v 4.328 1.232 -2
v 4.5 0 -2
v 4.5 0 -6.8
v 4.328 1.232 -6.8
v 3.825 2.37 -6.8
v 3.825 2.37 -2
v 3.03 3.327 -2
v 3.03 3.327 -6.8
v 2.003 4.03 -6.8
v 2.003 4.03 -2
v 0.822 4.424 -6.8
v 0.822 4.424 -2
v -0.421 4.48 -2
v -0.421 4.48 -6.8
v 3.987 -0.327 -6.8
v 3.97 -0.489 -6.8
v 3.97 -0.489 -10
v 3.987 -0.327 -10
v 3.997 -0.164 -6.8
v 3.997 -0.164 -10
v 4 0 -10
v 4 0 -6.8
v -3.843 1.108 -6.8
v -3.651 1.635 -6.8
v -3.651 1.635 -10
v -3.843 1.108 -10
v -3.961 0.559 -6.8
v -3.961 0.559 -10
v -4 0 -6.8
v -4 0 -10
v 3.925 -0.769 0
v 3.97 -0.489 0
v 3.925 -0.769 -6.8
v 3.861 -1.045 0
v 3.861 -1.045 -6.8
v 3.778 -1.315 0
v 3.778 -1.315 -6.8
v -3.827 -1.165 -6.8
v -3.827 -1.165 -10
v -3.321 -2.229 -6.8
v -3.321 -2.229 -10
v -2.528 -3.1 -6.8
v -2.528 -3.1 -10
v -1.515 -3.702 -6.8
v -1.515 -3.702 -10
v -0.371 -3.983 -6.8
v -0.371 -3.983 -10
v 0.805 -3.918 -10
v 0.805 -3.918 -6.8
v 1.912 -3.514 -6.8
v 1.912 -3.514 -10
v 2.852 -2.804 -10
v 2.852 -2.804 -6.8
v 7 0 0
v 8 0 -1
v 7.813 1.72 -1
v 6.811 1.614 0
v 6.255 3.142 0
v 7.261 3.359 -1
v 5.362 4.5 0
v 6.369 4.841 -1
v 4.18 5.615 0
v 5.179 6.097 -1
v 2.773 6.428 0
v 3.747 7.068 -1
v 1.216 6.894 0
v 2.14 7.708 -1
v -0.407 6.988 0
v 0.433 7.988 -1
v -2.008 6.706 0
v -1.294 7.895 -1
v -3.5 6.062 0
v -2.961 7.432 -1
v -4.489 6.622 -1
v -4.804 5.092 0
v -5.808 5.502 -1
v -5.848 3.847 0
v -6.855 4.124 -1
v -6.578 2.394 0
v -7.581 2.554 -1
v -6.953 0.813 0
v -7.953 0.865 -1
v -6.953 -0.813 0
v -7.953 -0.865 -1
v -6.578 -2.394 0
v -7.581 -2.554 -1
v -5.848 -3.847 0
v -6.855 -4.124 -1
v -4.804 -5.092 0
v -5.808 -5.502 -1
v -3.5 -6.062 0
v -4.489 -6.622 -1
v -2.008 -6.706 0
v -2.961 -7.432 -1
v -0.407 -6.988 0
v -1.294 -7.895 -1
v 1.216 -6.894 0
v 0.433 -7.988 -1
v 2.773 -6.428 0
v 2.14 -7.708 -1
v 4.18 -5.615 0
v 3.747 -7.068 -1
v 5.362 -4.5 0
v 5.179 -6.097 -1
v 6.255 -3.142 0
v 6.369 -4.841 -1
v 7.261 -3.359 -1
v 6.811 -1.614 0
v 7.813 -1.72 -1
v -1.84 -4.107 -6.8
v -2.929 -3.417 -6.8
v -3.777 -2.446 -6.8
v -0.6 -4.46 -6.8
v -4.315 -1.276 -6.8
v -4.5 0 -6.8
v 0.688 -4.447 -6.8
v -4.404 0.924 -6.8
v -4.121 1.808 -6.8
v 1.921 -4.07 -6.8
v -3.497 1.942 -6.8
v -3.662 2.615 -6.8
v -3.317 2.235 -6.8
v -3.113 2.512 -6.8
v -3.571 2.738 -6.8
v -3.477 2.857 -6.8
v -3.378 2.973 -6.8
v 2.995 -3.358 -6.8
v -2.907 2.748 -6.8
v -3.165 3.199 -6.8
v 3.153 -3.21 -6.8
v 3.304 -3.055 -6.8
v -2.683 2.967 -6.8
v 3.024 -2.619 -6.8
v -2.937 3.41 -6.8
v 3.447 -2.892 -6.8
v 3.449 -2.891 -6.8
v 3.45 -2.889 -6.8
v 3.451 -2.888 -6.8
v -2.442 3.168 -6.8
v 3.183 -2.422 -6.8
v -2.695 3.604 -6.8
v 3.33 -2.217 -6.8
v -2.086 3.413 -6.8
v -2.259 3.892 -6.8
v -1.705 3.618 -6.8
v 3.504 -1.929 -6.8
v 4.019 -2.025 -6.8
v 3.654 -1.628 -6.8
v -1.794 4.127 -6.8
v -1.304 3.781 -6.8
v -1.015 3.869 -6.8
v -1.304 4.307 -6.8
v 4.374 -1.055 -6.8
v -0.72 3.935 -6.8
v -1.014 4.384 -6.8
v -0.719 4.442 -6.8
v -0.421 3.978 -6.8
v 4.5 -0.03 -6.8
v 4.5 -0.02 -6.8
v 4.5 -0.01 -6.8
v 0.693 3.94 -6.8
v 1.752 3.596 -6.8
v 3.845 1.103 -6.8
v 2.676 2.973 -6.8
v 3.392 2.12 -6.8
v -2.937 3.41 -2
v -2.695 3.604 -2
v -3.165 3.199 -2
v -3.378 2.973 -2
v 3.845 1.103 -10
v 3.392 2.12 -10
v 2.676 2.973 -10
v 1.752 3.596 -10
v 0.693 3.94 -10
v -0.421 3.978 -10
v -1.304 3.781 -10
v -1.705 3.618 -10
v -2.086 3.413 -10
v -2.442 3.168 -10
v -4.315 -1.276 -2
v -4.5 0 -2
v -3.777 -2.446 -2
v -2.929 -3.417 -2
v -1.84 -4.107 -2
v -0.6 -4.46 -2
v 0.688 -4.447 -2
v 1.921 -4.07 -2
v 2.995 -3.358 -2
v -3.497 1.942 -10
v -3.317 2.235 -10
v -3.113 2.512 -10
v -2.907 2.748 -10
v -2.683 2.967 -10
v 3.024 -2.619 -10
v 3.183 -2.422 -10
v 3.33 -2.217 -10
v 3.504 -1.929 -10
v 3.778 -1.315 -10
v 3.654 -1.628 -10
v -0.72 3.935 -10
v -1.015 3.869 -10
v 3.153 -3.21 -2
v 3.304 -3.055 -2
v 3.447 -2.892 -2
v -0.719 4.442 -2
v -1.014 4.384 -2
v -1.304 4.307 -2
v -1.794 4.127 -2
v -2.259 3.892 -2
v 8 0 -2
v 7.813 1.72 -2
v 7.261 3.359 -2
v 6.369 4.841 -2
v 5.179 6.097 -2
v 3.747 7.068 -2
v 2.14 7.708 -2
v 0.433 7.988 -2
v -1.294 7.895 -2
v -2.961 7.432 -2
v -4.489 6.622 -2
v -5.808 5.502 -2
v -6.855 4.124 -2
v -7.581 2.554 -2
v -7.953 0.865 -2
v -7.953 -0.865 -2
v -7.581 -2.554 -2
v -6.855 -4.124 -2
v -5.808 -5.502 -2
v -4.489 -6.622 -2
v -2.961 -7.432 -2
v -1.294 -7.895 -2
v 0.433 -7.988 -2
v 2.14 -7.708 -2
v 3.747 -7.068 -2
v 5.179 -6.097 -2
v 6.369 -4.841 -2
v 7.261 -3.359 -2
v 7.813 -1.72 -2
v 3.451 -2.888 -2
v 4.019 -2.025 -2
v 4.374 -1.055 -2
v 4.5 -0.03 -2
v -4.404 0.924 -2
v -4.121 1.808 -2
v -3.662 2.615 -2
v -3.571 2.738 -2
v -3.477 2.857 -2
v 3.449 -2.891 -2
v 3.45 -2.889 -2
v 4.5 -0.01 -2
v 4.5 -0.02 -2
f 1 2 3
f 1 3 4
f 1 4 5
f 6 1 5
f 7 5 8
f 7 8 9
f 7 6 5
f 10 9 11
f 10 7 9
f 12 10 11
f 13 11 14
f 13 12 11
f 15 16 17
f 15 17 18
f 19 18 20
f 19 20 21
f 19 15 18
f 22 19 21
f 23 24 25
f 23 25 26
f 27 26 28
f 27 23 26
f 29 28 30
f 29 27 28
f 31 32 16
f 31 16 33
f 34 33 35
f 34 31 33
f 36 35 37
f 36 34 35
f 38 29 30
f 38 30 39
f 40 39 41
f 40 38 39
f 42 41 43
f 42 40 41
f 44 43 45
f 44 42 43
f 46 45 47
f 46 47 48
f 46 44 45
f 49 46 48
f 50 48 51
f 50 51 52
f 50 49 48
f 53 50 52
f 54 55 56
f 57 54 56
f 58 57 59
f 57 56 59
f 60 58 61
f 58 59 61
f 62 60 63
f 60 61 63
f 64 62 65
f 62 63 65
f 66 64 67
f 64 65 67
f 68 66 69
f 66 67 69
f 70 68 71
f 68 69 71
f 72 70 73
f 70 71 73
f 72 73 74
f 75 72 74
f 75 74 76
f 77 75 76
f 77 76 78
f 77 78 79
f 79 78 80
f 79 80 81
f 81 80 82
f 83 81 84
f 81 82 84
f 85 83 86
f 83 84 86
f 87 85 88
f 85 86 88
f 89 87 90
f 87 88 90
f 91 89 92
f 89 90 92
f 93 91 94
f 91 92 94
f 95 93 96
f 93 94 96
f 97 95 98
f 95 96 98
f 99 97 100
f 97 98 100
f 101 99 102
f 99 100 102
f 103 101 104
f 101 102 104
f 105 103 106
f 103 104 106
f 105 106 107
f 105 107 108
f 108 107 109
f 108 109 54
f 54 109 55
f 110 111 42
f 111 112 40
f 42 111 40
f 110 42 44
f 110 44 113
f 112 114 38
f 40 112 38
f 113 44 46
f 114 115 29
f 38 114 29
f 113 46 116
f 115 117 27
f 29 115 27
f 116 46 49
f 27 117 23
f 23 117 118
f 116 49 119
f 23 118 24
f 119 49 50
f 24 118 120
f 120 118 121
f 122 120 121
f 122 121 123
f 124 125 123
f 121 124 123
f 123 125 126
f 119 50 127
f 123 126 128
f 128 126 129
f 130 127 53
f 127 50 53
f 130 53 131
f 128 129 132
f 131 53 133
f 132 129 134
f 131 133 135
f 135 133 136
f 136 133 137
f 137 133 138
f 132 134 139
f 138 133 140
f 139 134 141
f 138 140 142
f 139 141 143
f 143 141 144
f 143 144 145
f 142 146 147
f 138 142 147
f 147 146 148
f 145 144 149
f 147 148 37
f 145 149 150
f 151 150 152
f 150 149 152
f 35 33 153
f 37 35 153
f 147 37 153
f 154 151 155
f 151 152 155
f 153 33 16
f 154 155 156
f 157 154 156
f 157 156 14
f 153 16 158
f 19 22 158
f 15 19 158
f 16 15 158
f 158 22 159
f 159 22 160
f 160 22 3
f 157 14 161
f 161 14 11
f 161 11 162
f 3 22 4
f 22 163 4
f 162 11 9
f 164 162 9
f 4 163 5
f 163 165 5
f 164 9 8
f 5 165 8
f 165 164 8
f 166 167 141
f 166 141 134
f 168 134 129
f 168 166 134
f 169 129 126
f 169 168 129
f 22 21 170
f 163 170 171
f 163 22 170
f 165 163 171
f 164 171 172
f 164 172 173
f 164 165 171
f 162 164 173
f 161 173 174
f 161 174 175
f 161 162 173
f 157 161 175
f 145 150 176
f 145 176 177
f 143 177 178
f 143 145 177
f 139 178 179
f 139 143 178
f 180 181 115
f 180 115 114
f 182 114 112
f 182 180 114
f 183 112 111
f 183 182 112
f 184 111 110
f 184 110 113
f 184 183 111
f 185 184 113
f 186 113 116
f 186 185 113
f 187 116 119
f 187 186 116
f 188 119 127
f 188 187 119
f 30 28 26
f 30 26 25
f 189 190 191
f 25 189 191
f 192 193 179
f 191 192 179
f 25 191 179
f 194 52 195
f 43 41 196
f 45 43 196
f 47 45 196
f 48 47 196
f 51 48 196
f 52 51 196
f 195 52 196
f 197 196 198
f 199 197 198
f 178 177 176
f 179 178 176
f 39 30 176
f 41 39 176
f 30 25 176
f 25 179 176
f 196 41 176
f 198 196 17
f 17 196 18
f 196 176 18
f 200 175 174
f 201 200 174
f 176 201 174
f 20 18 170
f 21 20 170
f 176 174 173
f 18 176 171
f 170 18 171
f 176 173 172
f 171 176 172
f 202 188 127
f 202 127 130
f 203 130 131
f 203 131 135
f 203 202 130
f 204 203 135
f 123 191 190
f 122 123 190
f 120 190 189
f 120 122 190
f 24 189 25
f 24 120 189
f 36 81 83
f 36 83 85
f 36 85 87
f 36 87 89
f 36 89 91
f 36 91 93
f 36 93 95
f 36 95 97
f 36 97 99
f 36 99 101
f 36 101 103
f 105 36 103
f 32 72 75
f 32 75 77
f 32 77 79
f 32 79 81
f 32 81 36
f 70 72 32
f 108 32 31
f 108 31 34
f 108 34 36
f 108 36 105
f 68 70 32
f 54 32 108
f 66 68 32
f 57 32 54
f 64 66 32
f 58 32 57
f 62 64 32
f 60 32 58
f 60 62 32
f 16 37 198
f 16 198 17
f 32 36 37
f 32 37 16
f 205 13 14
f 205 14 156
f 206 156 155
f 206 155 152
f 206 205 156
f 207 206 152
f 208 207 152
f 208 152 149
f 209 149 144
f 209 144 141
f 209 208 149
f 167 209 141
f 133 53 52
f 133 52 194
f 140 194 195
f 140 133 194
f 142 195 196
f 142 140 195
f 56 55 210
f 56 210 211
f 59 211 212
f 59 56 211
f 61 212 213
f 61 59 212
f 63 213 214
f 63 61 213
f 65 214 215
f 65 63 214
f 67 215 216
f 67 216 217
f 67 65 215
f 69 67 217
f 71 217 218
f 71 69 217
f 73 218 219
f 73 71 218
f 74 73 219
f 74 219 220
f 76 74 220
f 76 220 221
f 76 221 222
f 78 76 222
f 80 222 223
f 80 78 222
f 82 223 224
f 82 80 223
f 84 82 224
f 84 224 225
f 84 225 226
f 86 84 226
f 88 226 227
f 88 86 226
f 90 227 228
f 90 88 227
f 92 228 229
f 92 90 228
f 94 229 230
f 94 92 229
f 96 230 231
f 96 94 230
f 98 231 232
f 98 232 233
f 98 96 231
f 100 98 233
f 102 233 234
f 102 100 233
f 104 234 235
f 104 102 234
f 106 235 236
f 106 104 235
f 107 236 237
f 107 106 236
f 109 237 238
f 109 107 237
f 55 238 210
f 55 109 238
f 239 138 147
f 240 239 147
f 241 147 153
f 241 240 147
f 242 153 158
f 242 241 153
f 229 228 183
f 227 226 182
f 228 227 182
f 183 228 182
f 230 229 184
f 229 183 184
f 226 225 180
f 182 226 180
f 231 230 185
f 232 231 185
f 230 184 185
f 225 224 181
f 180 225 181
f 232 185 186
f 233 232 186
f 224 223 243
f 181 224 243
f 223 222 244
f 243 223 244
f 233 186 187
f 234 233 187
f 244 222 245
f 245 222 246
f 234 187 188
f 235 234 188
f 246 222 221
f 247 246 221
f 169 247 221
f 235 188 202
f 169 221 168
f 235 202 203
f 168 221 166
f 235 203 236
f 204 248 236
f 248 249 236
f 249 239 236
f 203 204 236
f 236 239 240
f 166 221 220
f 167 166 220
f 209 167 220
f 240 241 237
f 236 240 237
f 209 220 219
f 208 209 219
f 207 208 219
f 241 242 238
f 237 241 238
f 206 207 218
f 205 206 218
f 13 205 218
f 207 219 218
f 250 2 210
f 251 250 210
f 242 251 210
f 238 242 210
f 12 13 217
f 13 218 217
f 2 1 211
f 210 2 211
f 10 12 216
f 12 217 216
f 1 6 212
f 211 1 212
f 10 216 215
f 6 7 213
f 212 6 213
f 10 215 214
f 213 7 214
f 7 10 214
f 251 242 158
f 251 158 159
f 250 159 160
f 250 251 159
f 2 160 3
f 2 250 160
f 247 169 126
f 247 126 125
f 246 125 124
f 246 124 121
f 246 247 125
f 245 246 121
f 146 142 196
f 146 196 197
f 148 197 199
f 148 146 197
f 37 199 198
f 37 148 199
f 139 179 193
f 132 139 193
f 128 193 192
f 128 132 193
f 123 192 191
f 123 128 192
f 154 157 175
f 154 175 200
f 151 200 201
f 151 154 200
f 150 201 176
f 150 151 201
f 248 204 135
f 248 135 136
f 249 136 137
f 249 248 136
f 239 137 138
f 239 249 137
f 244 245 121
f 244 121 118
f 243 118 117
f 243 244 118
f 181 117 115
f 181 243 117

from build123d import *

# Parameters (mm, degrees)
F0_R     = 8
F1_DEPTH = 2
F2_DEPTH = 10
F3_SIZE  = 1
F4_DEPTH = 6.8


with BuildPart() as f1:
    # F0 (on Top) → F1 (new body)
    with BuildSketch(Plane.XY):
        Circle(F0_R)
        with BuildLine():
            Line((-0.4206175605, 4.6308473112), (-0.4206175605, 4.480299194))
            ThreePointArc((-0.4206175605, 4.480299194), (3.0296221693, 3.3273697587), (4.5, 0))
            ThreePointArc((4.5, 0), (4.4999743656, -0.0151891034), (4.4998974627, -0.0303780337))
            Line((4.4998974627, -0.0303780337), (4.81998135, -0.0303780337))
            Line((4.81998135, -0.0303780337), (3.914092806, -3.5892815224))
            Line((3.914092806, -3.5892815224), (3.0549396986, -3.5892815224))
            Line((3.0549396986, -3.5892815224), (2.9953533938, -3.3582522309))
            ThreePointArc((2.9953533938, -3.3582522309), (-1.8399605604, -4.1066464586), (-4.5, 0))
            Line((-4.5, 0), (-4.5284801459, 0))
            Line((-4.5284801459, 0), (-4.5284801459, 4.6308473112))
            Line((-4.5284801459, 4.6308473112), (-3.2899387989, 4.6308473112))
            Line((-3.2899387989, 4.6308473112), (-2.6946144665, 3.6040328629))
            ThreePointArc((-2.6946144665, 3.6040328629), (-2.0301577082, 4.0160253585), (-1.3044212058, 4.3067952491))
            Line((-1.3044212058, 4.3067952491), (-1.3044212058, 4.6308473112))
            Line((-1.3044212058, 4.6308473112), (-0.4206175605, 4.6308473112))
        make_face(mode=Mode.SUBTRACT)
        with BuildLine():
            Line((4.81998135, -0.0303780337), (4.4998974627, -0.0303780337))
            ThreePointArc((4.4998974627, -0.0303780337), (4.2245195635, -1.5503014087), (3.4513785085, -2.8875571667))
            add(Edge.make_bspline(
                [(3.449075213, -2.9053863018), (3.4501950312, -2.8965722486), (3.4513785085, -2.8875571667)],
                knots=[0, 0, 0, 0.0463757333, 0.0463757333, 0.0463757333], degree=2))
            add(Edge.make_bspline(
                [(3.4473158422, -2.8924061755), (3.4482086621, -2.8989381442), (3.449075213, -2.9053863018)],
                knots=[0.9672794895, 0.9672794895, 0.9672794895, 1, 1, 1], degree=2))
            ThreePointArc((3.4473158422, -2.8924061755), (3.2297445499, -3.133488494), (2.9953533938, -3.3582522309))
            Line((2.9953533938, -3.3582522309), (3.0549396986, -3.5892815224))
            Line((3.0549396986, -3.5892815224), (3.914092806, -3.5892815224))
            Line((3.914092806, -3.5892815224), (4.81998135, -0.0303780337))
        make_face()
        with BuildLine():
            Line((3.6243330998, -1.9730143438), (3.7775337391, -1.3153854378))
            ThreePointArc((3.7775337391, -1.3153854378), (3.582032846, -1.7801799601), (3.3296101941, -2.2166858043))
            add(Edge.make_bspline(
                [(3.3296101941, -2.2166858043), (3.3489440989, -2.3108458429), (3.3715722808, -2.4329689313)],
                knots=[0.5564798986, 0.5564798986, 0.5564798986, 1, 1, 1], degree=2))
            add(Edge.make_bspline(
                [(3.3715722808, -2.4329689313), (3.4209224143, -2.6993089647), (3.4473158422, -2.8924061755)],
                knots=[0, 0, 0, 0.9672794895, 0.9672794895, 0.9672794895], degree=2))
            ThreePointArc((3.4473158422, -2.8924061755), (3.4493480274, -2.889982385), (3.4513785085, -2.8875571667))
            add(Edge.make_bspline(
                [(3.4513785085, -2.8875571667), (3.4757143538, -2.7021800266), (3.5269676071, -2.4318005454)],
                knots=[0.0463757333, 0.0463757333, 0.0463757333, 1, 1, 1], degree=2))
            add(Edge.make_bspline(
                [(3.5269676071, -2.4318005454), (3.5807133591, -2.1482722307), (3.6243330998, -1.9730143438)],
                knots=[0, 0, 0, 1, 1, 1], degree=2))
        make_face()
        with BuildLine():
            add(Edge.make_bspline(
                [(3.449075213, -2.9053863018), (3.4501950312, -2.8965722486), (3.4513785085, -2.8875571667)],
                knots=[0, 0, 0, 0.0463757333, 0.0463757333, 0.0463757333], degree=2))
            ThreePointArc((3.4513785085, -2.8875571667), (3.4493480274, -2.889982385), (3.4473158422, -2.8924061755))
            add(Edge.make_bspline(
                [(3.4473158422, -2.8924061755), (3.4482086621, -2.8989381442), (3.449075213, -2.9053863018)],
                knots=[0.9672794895, 0.9672794895, 0.9672794895, 1, 1, 1], degree=2))
        make_face()
        with BuildLine():
            ThreePointArc((-3.3782910952, 2.9727343097), (-3.0528150871, 3.3061034533), (-2.6946144665, 3.6040328629))
            Line((-2.6946144665, 3.6040328629), (-3.2899387989, 4.6308473112))
            Line((-3.2899387989, 4.6308473112), (-4.5284801459, 4.6308473112))
            Line((-4.5284801459, 4.6308473112), (-4.5284801459, 0))
            Line((-4.5284801459, 0), (-4.5, 0))
            ThreePointArc((-4.5, 0), (-4.2853533562, 1.373224895), (-3.6618903945, 2.6154461834))
            add(Edge.make_bspline(
                [(-3.7115698957, 3.5027814199), (-3.6767769858, 2.9721895436), (-3.6618903945, 2.6154461834)],
                knots=[0, 0, 0, 0.5721372164, 0.5721372164, 0.5721372164], degree=2))
            Line((-3.7115698957, 3.5027814199), (-3.6831908796, 3.5027814199))
            Line((-3.6831908796, 3.5027814199), (-3.3782910952, 2.9727343097))
        make_face()
        with BuildLine():
            ThreePointArc((-1.3044212058, 4.3067952491), (-0.8668711502, 4.4157144845), (-0.4206175605, 4.480299194))
            Line((-0.4206175605, 4.480299194), (-0.4206175605, 4.6308473112))
            Line((-0.4206175605, 4.6308473112), (-1.3044212058, 4.6308473112))
            Line((-1.3044212058, 4.6308473112), (-1.3044212058, 4.3067952491))
        make_face()
        with BuildLine():
            ThreePointArc((-3.6618903945, 2.6154461834), (-3.5246209092, 2.797686088), (-3.3782910952, 2.9727343097))
            Line((-3.3782910952, 2.9727343097), (-3.6831908796, 3.5027814199))
            Line((-3.6831908796, 3.5027814199), (-3.7115698957, 3.5027814199))
            add(Edge.make_bspline(
                [(-3.7115698957, 3.5027814199), (-3.6767769858, 2.9721895436), (-3.6618903945, 2.6154461834)],
                knots=[0, 0, 0, 0.5721372164, 0.5721372164, 0.5721372164], degree=2))
        make_face()
    extrude(amount=-F1_DEPTH)

    # F0 (on Top) → F2 (join)
    with BuildSketch(Plane.XY):
        with BuildLine():
            ThreePointArc((3.969940759, -0.4894592628), (3.9924781174, -0.2451907053), (4, 0))
            ThreePointArc((4, 0), (2.6755868289, 2.9734214503), (-0.4206175605, 3.9778236346))
            Line((-0.4206175605, 3.9778236346), (-0.4206175605, 0))
            Line((-0.4206175605, 0), (-1.6682807341, 0))
            Line((-1.6682807341, 0), (-3.1130920504, 2.5117041796))
            ThreePointArc((-3.1130920504, 2.5117041796), (-3.410240025, 2.0905173934), (-3.6507577183, 1.6346155763))
            Line((-3.6507577183, 1.6346155763), (-3.6507577183, 0))
            Line((-3.6507577183, 0), (-4, 0))
            ThreePointArc((-4, 0), (-1.5149568149, -3.7020137559), (2.8524529245, -2.8041954842))
            Line((2.8524529245, -2.8041954842), (2.5727857788, -1.7198640628))
            add(Edge.make_bspline(
                [(2.5727857788, -1.7198640628), (2.5463023648, -1.6201617983), (2.4816516776, -1.3074238358)],
                knots=[0, 0, 0, 1, 1, 1], degree=2))
            add(Edge.make_bspline(
                [(2.4816516776, -1.3074238358), (2.4170009905, -0.9946858733), (2.4076539032, -0.8871943694)],
                knots=[0, 0, 0, 1, 1, 1], degree=2))
            add(Edge.make_bspline(
                [(2.4076539032, -0.8871943694), (2.3928543483, -1.0188325155), (2.3344350527, -1.3097606076)],
                knots=[0, 0, 0, 1, 1, 1], degree=2))
            add(Edge.make_bspline(
                [(2.3344350527, -1.3097606076), (2.2760157571, -1.6006886998), (2.2440798755, -1.7245376065)],
                knots=[0, 0, 0, 1, 1, 1], degree=2))
            Line((2.2440798755, -1.7245376065), (1.7650416514, -3.5892815224))
            Line((1.7650416514, -3.5892815224), (0.9082253158, -3.5892815224))
            Line((0.9082253158, -3.5892815224), (0, -0.0303780337))
            Line((0, -0.0303780337), (0.7423145162, -0.0303780337))
            Line((0.7423145162, -0.0303780337), (1.197985022, -1.9730143438))
            add(Edge.make_bspline(
                [(1.197985022, -1.9730143438), (1.3171603851, -2.5112507874), (1.3701272131, -2.9053863018)],
                knots=[0, 0, 0, 1, 1, 1], degree=2))
            add(Edge.make_bspline(
                [(1.3701272131, -2.9053863018), (1.384926768, -2.7667378402), (1.437504134, -2.4758097481)],
                knots=[0, 0, 0, 1, 1, 1], degree=2))
            add(Edge.make_bspline(
                [(1.437504134, -2.4758097481), (1.4900815001, -2.1848816559), (1.5360380126, -2.024423324)],
                knots=[0, 0, 0, 1, 1, 1], degree=2))
            Line((1.5360380126, -2.024423324), (2.0548013577, -0.0303780337))
            Line((2.0548013577, -0.0303780337), (2.7675167642, -0.0303780337))
            Line((2.7675167642, -0.0303780337), (3.2862801092, -2.024423324))
            add(Edge.make_bspline(
                [(3.2862801092, -2.024423324), (3.3053521519, -2.0985442172), (3.3296101941, -2.2166858043)],
                knots=[0, 0, 0, 0.5564798986, 0.5564798986, 0.5564798986], degree=2))
            ThreePointArc((3.3296101941, -2.2166858043), (3.582032846, -1.7801799601), (3.7775337391, -1.3153854378))
            Line((3.7775337391, -1.3153854378), (3.969940759, -0.4894592628))
        make_face()
        with BuildLine():
            Line((-3.6507577183, 0), (-3.6507577183, 1.6346155763))
            ThreePointArc((-3.6507577183, 1.6346155763), (-3.9117151528, 0.8357538893), (-4, 0))
            Line((-4, 0), (-3.6507577183, 0))
        make_face()
        with BuildLine():
            Line((-1.3044212058, 2.4385683149), (-1.3044212058, 3.7813338014))
            ThreePointArc((-1.3044212058, 3.7813338014), (-1.8980842541, 3.5209765924), (-2.4418962915, 3.1681449622))
            Line((-2.4418962915, 3.1681449622), (-1.2790827986, 1.1625261252))
            Line((-1.2790827986, 1.1625261252), (-1.2567850002, 1.1625261252))
            add(Edge.make_bspline(
                [(-1.2567850002, 1.1625261252), (-1.3044212058, 2.06558696), (-1.3044212058, 2.4385683149)],
                knots=[0, 0, 0, 1, 1, 1], degree=2))
        make_face()
        with BuildLine():
            ThreePointArc((2.8524529245, -2.8041954842), (3.104958616, -2.5217517707), (3.3296101941, -2.2166858043))
            add(Edge.make_bspline(
                [(3.2862801092, -2.024423324), (3.3053521519, -2.0985442172), (3.3296101941, -2.2166858043)],
                knots=[0, 0, 0, 0.5564798986, 0.5564798986, 0.5564798986], degree=2))
            Line((3.2862801092, -2.024423324), (2.7675167642, -0.0303780337))
            Line((2.7675167642, -0.0303780337), (2.0548013577, -0.0303780337))
            Line((2.0548013577, -0.0303780337), (1.5360380126, -2.024423324))
            add(Edge.make_bspline(
                [(1.437504134, -2.4758097481), (1.4900815001, -2.1848816559), (1.5360380126, -2.024423324)],
                knots=[0, 0, 0, 1, 1, 1], degree=2))
            add(Edge.make_bspline(
                [(1.3701272131, -2.9053863018), (1.384926768, -2.7667378402), (1.437504134, -2.4758097481)],
                knots=[0, 0, 0, 1, 1, 1], degree=2))
            add(Edge.make_bspline(
                [(1.197985022, -1.9730143438), (1.3171603851, -2.5112507874), (1.3701272131, -2.9053863018)],
                knots=[0, 0, 0, 1, 1, 1], degree=2))
            Line((1.197985022, -1.9730143438), (0.7423145162, -0.0303780337))
            Line((0.7423145162, -0.0303780337), (0, -0.0303780337))
            Line((0, -0.0303780337), (0.9082253158, -3.5892815224))
            Line((0.9082253158, -3.5892815224), (1.7650416514, -3.5892815224))
            Line((1.7650416514, -3.5892815224), (2.2440798755, -1.7245376065))
            add(Edge.make_bspline(
                [(2.3344350527, -1.3097606076), (2.2760157571, -1.6006886998), (2.2440798755, -1.7245376065)],
                knots=[0, 0, 0, 1, 1, 1], degree=2))
            add(Edge.make_bspline(
                [(2.4076539032, -0.8871943694), (2.3928543483, -1.0188325155), (2.3344350527, -1.3097606076)],
                knots=[0, 0, 0, 1, 1, 1], degree=2))
            add(Edge.make_bspline(
                [(2.4816516776, -1.3074238358), (2.4170009905, -0.9946858733), (2.4076539032, -0.8871943694)],
                knots=[0, 0, 0, 1, 1, 1], degree=2))
            add(Edge.make_bspline(
                [(2.5727857788, -1.7198640628), (2.5463023648, -1.6201617983), (2.4816516776, -1.3074238358)],
                knots=[0, 0, 0, 1, 1, 1], degree=2))
            Line((2.5727857788, -1.7198640628), (2.8524529245, -2.8041954842))
        make_face()
        with BuildLine():
            Line((-0.4206175605, 0), (-0.4206175605, 3.9778236346))
            ThreePointArc((-0.4206175605, 3.9778236346), (-0.8680966248, 3.9046649344), (-1.3044212058, 3.7813338014))
            Line((-1.3044212058, 3.7813338014), (-1.3044212058, 2.4385683149))
            add(Edge.make_bspline(
                [(-1.2567850002, 1.1625261252), (-1.3044212058, 2.06558696), (-1.3044212058, 2.4385683149)],
                knots=[0, 0, 0, 1, 1, 1], degree=2))
            Line((-1.2567850002, 1.1625261252), (-1.2790827986, 1.1625261252))
            Line((-1.2790827986, 1.1625261252), (-2.4418962915, 3.1681449622))
            ThreePointArc((-2.4418962915, 3.1681449622), (-2.7968200684, 2.8596848612), (-3.1130920504, 2.5117041796))
            Line((-3.1130920504, 2.5117041796), (-1.6682807341, 0))
            Line((-1.6682807341, 0), (-0.4206175605, 0))
        make_face()
    extrude(amount=-F2_DEPTH)

    # F3
    f3_edges = [f1.edges().sort_by_distance(p)[0] for p in [
        (-8, 0, 0),
    ]]
    chamfer(f3_edges, length=F3_SIZE)

    # F0 (on Top) → F4 (join)
    with BuildSketch(Plane.XY):
        with BuildLine():
            Line((4.0768879098, -0.0303780337), (3.969940759, -0.4894592628))
            ThreePointArc((3.969940759, -0.4894592628), (3.8956872033, -0.907535792), (3.7775337391, -1.3153854378))
            Line((3.7775337391, -1.3153854378), (3.6243330998, -1.9730143438))
            add(Edge.make_bspline(
                [(3.5269676071, -2.4318005454), (3.5807133591, -2.1482722307), (3.6243330998, -1.9730143438)],
                knots=[0, 0, 0, 1, 1, 1], degree=2))
            add(Edge.make_bspline(
                [(3.4513785085, -2.8875571667), (3.4757143538, -2.7021800266), (3.5269676071, -2.4318005454)],
                knots=[0.0463757333, 0.0463757333, 0.0463757333, 1, 1, 1], degree=2))
            ThreePointArc((3.4513785085, -2.8875571667), (4.2245195635, -1.5503014087), (4.4998974627, -0.0303780337))
            Line((4.4998974627, -0.0303780337), (4.0768879098, -0.0303780337))
        make_face()
        with BuildLine():
            Line((3.6243330998, -1.9730143438), (3.7775337391, -1.3153854378))
            ThreePointArc((3.7775337391, -1.3153854378), (3.582032846, -1.7801799601), (3.3296101941, -2.2166858043))
            add(Edge.make_bspline(
                [(3.3296101941, -2.2166858043), (3.3489440989, -2.3108458429), (3.3715722808, -2.4329689313)],
                knots=[0.5564798986, 0.5564798986, 0.5564798986, 1, 1, 1], degree=2))
            add(Edge.make_bspline(
                [(3.3715722808, -2.4329689313), (3.4209224143, -2.6993089647), (3.4473158422, -2.8924061755)],
                knots=[0, 0, 0, 0.9672794895, 0.9672794895, 0.9672794895], degree=2))
            ThreePointArc((3.4473158422, -2.8924061755), (3.4493480274, -2.889982385), (3.4513785085, -2.8875571667))
            add(Edge.make_bspline(
                [(3.4513785085, -2.8875571667), (3.4757143538, -2.7021800266), (3.5269676071, -2.4318005454)],
                knots=[0.0463757333, 0.0463757333, 0.0463757333, 1, 1, 1], degree=2))
            add(Edge.make_bspline(
                [(3.5269676071, -2.4318005454), (3.5807133591, -2.1482722307), (3.6243330998, -1.9730143438)],
                knots=[0, 0, 0, 1, 1, 1], degree=2))
        make_face()
        with BuildLine():
            add(Edge.make_bspline(
                [(3.3296101941, -2.2166858043), (3.3489440989, -2.3108458429), (3.3715722808, -2.4329689313)],
                knots=[0.5564798986, 0.5564798986, 0.5564798986, 1, 1, 1], degree=2))
            ThreePointArc((3.3296101941, -2.2166858043), (3.104958616, -2.5217517707), (2.8524529245, -2.8041954842))
            Line((2.8524529245, -2.8041954842), (2.9953533938, -3.3582522309))
            ThreePointArc((2.9953533938, -3.3582522309), (3.2297445499, -3.133488494), (3.4473158422, -2.8924061755))
            add(Edge.make_bspline(
                [(3.3715722808, -2.4329689313), (3.4209224143, -2.6993089647), (3.4473158422, -2.8924061755)],
                knots=[0, 0, 0, 0.9672794895, 0.9672794895, 0.9672794895], degree=2))
        make_face()
        with BuildLine():
            Line((2.9953533938, -3.3582522309), (2.8524529245, -2.8041954842))
            ThreePointArc((2.8524529245, -2.8041954842), (-1.5149568149, -3.7020137559), (-4, 0))
            Line((-4, 0), (-4.5, 0))
            ThreePointArc((-4.5, 0), (-1.8399605604, -4.1066464586), (2.9953533938, -3.3582522309))
        make_face()
        with BuildLine():
            ThreePointArc((-0.4206175605, 3.9778236346), (2.6755868289, 2.9734214503), (4, 0))
            ThreePointArc((4, 0), (3.9924781174, -0.2451907053), (3.969940759, -0.4894592628))
            Line((3.969940759, -0.4894592628), (4.0768879098, -0.0303780337))
            Line((4.0768879098, -0.0303780337), (4.4998974627, -0.0303780337))
            ThreePointArc((4.4998974627, -0.0303780337), (4.4999743656, -0.0151891034), (4.5, 0))
            ThreePointArc((4.5, 0), (3.0296221693, 3.3273697587), (-0.4206175605, 4.480299194))
            Line((-0.4206175605, 4.480299194), (-0.4206175605, 3.9778236346))
        make_face()
        with BuildLine():
            ThreePointArc((-1.3044212058, 3.7813338014), (-0.8680966248, 3.9046649344), (-0.4206175605, 3.9778236346))
            Line((-0.4206175605, 3.9778236346), (-0.4206175605, 4.480299194))
            ThreePointArc((-0.4206175605, 4.480299194), (-0.8668711502, 4.4157144845), (-1.3044212058, 4.3067952491))
            Line((-1.3044212058, 4.3067952491), (-1.3044212058, 3.7813338014))
        make_face()
        with BuildLine():
            ThreePointArc((-2.4418962915, 3.1681449622), (-1.8980842541, 3.5209765924), (-1.3044212058, 3.7813338014))
            Line((-1.3044212058, 3.7813338014), (-1.3044212058, 4.3067952491))
            ThreePointArc((-1.3044212058, 4.3067952491), (-2.0301577082, 4.0160253585), (-2.6946144665, 3.6040328629))
            Line((-2.6946144665, 3.6040328629), (-2.4418962915, 3.1681449622))
        make_face()
        with BuildLine():
            ThreePointArc((-3.1130920504, 2.5117041796), (-2.7968200684, 2.8596848612), (-2.4418962915, 3.1681449622))
            Line((-2.4418962915, 3.1681449622), (-2.6946144665, 3.6040328629))
            ThreePointArc((-2.6946144665, 3.6040328629), (-3.0528150871, 3.3061034533), (-3.3782910952, 2.9727343097))
            Line((-3.3782910952, 2.9727343097), (-3.1130920504, 2.5117041796))
        make_face()
        with BuildLine():
            ThreePointArc((-4, 0), (-3.9117151528, 0.8357538893), (-3.6507577183, 1.6346155763))
            Line((-3.6507577183, 1.6346155763), (-3.6507577183, 2.1791030245))
            add(Edge.make_bspline(
                [(-3.6618903945, 2.6154461834), (-3.6507577183, 2.3486619178), (-3.6507577183, 2.1791030245)],
                knots=[0.5721372164, 0.5721372164, 0.5721372164, 1, 1, 1], degree=2))
            ThreePointArc((-3.6618903945, 2.6154461834), (-4.2853533562, 1.373224895), (-4.5, 0))
            Line((-4.5, 0), (-4, 0))
        make_face()
        with BuildLine():
            ThreePointArc((-3.6507577183, 1.6346155763), (-3.410240025, 2.0905173934), (-3.1130920504, 2.5117041796))
            Line((-3.1130920504, 2.5117041796), (-3.3782910952, 2.9727343097))
            ThreePointArc((-3.3782910952, 2.9727343097), (-3.5246209092, 2.797686088), (-3.6618903945, 2.6154461834))
            add(Edge.make_bspline(
                [(-3.6618903945, 2.6154461834), (-3.6507577183, 2.3486619178), (-3.6507577183, 2.1791030245)],
                knots=[0.5721372164, 0.5721372164, 0.5721372164, 1, 1, 1], degree=2))
            Line((-3.6507577183, 2.1791030245), (-3.6507577183, 1.6346155763))
        make_face()
    extrude(amount=-F4_DEPTH)


solid = f1.part
